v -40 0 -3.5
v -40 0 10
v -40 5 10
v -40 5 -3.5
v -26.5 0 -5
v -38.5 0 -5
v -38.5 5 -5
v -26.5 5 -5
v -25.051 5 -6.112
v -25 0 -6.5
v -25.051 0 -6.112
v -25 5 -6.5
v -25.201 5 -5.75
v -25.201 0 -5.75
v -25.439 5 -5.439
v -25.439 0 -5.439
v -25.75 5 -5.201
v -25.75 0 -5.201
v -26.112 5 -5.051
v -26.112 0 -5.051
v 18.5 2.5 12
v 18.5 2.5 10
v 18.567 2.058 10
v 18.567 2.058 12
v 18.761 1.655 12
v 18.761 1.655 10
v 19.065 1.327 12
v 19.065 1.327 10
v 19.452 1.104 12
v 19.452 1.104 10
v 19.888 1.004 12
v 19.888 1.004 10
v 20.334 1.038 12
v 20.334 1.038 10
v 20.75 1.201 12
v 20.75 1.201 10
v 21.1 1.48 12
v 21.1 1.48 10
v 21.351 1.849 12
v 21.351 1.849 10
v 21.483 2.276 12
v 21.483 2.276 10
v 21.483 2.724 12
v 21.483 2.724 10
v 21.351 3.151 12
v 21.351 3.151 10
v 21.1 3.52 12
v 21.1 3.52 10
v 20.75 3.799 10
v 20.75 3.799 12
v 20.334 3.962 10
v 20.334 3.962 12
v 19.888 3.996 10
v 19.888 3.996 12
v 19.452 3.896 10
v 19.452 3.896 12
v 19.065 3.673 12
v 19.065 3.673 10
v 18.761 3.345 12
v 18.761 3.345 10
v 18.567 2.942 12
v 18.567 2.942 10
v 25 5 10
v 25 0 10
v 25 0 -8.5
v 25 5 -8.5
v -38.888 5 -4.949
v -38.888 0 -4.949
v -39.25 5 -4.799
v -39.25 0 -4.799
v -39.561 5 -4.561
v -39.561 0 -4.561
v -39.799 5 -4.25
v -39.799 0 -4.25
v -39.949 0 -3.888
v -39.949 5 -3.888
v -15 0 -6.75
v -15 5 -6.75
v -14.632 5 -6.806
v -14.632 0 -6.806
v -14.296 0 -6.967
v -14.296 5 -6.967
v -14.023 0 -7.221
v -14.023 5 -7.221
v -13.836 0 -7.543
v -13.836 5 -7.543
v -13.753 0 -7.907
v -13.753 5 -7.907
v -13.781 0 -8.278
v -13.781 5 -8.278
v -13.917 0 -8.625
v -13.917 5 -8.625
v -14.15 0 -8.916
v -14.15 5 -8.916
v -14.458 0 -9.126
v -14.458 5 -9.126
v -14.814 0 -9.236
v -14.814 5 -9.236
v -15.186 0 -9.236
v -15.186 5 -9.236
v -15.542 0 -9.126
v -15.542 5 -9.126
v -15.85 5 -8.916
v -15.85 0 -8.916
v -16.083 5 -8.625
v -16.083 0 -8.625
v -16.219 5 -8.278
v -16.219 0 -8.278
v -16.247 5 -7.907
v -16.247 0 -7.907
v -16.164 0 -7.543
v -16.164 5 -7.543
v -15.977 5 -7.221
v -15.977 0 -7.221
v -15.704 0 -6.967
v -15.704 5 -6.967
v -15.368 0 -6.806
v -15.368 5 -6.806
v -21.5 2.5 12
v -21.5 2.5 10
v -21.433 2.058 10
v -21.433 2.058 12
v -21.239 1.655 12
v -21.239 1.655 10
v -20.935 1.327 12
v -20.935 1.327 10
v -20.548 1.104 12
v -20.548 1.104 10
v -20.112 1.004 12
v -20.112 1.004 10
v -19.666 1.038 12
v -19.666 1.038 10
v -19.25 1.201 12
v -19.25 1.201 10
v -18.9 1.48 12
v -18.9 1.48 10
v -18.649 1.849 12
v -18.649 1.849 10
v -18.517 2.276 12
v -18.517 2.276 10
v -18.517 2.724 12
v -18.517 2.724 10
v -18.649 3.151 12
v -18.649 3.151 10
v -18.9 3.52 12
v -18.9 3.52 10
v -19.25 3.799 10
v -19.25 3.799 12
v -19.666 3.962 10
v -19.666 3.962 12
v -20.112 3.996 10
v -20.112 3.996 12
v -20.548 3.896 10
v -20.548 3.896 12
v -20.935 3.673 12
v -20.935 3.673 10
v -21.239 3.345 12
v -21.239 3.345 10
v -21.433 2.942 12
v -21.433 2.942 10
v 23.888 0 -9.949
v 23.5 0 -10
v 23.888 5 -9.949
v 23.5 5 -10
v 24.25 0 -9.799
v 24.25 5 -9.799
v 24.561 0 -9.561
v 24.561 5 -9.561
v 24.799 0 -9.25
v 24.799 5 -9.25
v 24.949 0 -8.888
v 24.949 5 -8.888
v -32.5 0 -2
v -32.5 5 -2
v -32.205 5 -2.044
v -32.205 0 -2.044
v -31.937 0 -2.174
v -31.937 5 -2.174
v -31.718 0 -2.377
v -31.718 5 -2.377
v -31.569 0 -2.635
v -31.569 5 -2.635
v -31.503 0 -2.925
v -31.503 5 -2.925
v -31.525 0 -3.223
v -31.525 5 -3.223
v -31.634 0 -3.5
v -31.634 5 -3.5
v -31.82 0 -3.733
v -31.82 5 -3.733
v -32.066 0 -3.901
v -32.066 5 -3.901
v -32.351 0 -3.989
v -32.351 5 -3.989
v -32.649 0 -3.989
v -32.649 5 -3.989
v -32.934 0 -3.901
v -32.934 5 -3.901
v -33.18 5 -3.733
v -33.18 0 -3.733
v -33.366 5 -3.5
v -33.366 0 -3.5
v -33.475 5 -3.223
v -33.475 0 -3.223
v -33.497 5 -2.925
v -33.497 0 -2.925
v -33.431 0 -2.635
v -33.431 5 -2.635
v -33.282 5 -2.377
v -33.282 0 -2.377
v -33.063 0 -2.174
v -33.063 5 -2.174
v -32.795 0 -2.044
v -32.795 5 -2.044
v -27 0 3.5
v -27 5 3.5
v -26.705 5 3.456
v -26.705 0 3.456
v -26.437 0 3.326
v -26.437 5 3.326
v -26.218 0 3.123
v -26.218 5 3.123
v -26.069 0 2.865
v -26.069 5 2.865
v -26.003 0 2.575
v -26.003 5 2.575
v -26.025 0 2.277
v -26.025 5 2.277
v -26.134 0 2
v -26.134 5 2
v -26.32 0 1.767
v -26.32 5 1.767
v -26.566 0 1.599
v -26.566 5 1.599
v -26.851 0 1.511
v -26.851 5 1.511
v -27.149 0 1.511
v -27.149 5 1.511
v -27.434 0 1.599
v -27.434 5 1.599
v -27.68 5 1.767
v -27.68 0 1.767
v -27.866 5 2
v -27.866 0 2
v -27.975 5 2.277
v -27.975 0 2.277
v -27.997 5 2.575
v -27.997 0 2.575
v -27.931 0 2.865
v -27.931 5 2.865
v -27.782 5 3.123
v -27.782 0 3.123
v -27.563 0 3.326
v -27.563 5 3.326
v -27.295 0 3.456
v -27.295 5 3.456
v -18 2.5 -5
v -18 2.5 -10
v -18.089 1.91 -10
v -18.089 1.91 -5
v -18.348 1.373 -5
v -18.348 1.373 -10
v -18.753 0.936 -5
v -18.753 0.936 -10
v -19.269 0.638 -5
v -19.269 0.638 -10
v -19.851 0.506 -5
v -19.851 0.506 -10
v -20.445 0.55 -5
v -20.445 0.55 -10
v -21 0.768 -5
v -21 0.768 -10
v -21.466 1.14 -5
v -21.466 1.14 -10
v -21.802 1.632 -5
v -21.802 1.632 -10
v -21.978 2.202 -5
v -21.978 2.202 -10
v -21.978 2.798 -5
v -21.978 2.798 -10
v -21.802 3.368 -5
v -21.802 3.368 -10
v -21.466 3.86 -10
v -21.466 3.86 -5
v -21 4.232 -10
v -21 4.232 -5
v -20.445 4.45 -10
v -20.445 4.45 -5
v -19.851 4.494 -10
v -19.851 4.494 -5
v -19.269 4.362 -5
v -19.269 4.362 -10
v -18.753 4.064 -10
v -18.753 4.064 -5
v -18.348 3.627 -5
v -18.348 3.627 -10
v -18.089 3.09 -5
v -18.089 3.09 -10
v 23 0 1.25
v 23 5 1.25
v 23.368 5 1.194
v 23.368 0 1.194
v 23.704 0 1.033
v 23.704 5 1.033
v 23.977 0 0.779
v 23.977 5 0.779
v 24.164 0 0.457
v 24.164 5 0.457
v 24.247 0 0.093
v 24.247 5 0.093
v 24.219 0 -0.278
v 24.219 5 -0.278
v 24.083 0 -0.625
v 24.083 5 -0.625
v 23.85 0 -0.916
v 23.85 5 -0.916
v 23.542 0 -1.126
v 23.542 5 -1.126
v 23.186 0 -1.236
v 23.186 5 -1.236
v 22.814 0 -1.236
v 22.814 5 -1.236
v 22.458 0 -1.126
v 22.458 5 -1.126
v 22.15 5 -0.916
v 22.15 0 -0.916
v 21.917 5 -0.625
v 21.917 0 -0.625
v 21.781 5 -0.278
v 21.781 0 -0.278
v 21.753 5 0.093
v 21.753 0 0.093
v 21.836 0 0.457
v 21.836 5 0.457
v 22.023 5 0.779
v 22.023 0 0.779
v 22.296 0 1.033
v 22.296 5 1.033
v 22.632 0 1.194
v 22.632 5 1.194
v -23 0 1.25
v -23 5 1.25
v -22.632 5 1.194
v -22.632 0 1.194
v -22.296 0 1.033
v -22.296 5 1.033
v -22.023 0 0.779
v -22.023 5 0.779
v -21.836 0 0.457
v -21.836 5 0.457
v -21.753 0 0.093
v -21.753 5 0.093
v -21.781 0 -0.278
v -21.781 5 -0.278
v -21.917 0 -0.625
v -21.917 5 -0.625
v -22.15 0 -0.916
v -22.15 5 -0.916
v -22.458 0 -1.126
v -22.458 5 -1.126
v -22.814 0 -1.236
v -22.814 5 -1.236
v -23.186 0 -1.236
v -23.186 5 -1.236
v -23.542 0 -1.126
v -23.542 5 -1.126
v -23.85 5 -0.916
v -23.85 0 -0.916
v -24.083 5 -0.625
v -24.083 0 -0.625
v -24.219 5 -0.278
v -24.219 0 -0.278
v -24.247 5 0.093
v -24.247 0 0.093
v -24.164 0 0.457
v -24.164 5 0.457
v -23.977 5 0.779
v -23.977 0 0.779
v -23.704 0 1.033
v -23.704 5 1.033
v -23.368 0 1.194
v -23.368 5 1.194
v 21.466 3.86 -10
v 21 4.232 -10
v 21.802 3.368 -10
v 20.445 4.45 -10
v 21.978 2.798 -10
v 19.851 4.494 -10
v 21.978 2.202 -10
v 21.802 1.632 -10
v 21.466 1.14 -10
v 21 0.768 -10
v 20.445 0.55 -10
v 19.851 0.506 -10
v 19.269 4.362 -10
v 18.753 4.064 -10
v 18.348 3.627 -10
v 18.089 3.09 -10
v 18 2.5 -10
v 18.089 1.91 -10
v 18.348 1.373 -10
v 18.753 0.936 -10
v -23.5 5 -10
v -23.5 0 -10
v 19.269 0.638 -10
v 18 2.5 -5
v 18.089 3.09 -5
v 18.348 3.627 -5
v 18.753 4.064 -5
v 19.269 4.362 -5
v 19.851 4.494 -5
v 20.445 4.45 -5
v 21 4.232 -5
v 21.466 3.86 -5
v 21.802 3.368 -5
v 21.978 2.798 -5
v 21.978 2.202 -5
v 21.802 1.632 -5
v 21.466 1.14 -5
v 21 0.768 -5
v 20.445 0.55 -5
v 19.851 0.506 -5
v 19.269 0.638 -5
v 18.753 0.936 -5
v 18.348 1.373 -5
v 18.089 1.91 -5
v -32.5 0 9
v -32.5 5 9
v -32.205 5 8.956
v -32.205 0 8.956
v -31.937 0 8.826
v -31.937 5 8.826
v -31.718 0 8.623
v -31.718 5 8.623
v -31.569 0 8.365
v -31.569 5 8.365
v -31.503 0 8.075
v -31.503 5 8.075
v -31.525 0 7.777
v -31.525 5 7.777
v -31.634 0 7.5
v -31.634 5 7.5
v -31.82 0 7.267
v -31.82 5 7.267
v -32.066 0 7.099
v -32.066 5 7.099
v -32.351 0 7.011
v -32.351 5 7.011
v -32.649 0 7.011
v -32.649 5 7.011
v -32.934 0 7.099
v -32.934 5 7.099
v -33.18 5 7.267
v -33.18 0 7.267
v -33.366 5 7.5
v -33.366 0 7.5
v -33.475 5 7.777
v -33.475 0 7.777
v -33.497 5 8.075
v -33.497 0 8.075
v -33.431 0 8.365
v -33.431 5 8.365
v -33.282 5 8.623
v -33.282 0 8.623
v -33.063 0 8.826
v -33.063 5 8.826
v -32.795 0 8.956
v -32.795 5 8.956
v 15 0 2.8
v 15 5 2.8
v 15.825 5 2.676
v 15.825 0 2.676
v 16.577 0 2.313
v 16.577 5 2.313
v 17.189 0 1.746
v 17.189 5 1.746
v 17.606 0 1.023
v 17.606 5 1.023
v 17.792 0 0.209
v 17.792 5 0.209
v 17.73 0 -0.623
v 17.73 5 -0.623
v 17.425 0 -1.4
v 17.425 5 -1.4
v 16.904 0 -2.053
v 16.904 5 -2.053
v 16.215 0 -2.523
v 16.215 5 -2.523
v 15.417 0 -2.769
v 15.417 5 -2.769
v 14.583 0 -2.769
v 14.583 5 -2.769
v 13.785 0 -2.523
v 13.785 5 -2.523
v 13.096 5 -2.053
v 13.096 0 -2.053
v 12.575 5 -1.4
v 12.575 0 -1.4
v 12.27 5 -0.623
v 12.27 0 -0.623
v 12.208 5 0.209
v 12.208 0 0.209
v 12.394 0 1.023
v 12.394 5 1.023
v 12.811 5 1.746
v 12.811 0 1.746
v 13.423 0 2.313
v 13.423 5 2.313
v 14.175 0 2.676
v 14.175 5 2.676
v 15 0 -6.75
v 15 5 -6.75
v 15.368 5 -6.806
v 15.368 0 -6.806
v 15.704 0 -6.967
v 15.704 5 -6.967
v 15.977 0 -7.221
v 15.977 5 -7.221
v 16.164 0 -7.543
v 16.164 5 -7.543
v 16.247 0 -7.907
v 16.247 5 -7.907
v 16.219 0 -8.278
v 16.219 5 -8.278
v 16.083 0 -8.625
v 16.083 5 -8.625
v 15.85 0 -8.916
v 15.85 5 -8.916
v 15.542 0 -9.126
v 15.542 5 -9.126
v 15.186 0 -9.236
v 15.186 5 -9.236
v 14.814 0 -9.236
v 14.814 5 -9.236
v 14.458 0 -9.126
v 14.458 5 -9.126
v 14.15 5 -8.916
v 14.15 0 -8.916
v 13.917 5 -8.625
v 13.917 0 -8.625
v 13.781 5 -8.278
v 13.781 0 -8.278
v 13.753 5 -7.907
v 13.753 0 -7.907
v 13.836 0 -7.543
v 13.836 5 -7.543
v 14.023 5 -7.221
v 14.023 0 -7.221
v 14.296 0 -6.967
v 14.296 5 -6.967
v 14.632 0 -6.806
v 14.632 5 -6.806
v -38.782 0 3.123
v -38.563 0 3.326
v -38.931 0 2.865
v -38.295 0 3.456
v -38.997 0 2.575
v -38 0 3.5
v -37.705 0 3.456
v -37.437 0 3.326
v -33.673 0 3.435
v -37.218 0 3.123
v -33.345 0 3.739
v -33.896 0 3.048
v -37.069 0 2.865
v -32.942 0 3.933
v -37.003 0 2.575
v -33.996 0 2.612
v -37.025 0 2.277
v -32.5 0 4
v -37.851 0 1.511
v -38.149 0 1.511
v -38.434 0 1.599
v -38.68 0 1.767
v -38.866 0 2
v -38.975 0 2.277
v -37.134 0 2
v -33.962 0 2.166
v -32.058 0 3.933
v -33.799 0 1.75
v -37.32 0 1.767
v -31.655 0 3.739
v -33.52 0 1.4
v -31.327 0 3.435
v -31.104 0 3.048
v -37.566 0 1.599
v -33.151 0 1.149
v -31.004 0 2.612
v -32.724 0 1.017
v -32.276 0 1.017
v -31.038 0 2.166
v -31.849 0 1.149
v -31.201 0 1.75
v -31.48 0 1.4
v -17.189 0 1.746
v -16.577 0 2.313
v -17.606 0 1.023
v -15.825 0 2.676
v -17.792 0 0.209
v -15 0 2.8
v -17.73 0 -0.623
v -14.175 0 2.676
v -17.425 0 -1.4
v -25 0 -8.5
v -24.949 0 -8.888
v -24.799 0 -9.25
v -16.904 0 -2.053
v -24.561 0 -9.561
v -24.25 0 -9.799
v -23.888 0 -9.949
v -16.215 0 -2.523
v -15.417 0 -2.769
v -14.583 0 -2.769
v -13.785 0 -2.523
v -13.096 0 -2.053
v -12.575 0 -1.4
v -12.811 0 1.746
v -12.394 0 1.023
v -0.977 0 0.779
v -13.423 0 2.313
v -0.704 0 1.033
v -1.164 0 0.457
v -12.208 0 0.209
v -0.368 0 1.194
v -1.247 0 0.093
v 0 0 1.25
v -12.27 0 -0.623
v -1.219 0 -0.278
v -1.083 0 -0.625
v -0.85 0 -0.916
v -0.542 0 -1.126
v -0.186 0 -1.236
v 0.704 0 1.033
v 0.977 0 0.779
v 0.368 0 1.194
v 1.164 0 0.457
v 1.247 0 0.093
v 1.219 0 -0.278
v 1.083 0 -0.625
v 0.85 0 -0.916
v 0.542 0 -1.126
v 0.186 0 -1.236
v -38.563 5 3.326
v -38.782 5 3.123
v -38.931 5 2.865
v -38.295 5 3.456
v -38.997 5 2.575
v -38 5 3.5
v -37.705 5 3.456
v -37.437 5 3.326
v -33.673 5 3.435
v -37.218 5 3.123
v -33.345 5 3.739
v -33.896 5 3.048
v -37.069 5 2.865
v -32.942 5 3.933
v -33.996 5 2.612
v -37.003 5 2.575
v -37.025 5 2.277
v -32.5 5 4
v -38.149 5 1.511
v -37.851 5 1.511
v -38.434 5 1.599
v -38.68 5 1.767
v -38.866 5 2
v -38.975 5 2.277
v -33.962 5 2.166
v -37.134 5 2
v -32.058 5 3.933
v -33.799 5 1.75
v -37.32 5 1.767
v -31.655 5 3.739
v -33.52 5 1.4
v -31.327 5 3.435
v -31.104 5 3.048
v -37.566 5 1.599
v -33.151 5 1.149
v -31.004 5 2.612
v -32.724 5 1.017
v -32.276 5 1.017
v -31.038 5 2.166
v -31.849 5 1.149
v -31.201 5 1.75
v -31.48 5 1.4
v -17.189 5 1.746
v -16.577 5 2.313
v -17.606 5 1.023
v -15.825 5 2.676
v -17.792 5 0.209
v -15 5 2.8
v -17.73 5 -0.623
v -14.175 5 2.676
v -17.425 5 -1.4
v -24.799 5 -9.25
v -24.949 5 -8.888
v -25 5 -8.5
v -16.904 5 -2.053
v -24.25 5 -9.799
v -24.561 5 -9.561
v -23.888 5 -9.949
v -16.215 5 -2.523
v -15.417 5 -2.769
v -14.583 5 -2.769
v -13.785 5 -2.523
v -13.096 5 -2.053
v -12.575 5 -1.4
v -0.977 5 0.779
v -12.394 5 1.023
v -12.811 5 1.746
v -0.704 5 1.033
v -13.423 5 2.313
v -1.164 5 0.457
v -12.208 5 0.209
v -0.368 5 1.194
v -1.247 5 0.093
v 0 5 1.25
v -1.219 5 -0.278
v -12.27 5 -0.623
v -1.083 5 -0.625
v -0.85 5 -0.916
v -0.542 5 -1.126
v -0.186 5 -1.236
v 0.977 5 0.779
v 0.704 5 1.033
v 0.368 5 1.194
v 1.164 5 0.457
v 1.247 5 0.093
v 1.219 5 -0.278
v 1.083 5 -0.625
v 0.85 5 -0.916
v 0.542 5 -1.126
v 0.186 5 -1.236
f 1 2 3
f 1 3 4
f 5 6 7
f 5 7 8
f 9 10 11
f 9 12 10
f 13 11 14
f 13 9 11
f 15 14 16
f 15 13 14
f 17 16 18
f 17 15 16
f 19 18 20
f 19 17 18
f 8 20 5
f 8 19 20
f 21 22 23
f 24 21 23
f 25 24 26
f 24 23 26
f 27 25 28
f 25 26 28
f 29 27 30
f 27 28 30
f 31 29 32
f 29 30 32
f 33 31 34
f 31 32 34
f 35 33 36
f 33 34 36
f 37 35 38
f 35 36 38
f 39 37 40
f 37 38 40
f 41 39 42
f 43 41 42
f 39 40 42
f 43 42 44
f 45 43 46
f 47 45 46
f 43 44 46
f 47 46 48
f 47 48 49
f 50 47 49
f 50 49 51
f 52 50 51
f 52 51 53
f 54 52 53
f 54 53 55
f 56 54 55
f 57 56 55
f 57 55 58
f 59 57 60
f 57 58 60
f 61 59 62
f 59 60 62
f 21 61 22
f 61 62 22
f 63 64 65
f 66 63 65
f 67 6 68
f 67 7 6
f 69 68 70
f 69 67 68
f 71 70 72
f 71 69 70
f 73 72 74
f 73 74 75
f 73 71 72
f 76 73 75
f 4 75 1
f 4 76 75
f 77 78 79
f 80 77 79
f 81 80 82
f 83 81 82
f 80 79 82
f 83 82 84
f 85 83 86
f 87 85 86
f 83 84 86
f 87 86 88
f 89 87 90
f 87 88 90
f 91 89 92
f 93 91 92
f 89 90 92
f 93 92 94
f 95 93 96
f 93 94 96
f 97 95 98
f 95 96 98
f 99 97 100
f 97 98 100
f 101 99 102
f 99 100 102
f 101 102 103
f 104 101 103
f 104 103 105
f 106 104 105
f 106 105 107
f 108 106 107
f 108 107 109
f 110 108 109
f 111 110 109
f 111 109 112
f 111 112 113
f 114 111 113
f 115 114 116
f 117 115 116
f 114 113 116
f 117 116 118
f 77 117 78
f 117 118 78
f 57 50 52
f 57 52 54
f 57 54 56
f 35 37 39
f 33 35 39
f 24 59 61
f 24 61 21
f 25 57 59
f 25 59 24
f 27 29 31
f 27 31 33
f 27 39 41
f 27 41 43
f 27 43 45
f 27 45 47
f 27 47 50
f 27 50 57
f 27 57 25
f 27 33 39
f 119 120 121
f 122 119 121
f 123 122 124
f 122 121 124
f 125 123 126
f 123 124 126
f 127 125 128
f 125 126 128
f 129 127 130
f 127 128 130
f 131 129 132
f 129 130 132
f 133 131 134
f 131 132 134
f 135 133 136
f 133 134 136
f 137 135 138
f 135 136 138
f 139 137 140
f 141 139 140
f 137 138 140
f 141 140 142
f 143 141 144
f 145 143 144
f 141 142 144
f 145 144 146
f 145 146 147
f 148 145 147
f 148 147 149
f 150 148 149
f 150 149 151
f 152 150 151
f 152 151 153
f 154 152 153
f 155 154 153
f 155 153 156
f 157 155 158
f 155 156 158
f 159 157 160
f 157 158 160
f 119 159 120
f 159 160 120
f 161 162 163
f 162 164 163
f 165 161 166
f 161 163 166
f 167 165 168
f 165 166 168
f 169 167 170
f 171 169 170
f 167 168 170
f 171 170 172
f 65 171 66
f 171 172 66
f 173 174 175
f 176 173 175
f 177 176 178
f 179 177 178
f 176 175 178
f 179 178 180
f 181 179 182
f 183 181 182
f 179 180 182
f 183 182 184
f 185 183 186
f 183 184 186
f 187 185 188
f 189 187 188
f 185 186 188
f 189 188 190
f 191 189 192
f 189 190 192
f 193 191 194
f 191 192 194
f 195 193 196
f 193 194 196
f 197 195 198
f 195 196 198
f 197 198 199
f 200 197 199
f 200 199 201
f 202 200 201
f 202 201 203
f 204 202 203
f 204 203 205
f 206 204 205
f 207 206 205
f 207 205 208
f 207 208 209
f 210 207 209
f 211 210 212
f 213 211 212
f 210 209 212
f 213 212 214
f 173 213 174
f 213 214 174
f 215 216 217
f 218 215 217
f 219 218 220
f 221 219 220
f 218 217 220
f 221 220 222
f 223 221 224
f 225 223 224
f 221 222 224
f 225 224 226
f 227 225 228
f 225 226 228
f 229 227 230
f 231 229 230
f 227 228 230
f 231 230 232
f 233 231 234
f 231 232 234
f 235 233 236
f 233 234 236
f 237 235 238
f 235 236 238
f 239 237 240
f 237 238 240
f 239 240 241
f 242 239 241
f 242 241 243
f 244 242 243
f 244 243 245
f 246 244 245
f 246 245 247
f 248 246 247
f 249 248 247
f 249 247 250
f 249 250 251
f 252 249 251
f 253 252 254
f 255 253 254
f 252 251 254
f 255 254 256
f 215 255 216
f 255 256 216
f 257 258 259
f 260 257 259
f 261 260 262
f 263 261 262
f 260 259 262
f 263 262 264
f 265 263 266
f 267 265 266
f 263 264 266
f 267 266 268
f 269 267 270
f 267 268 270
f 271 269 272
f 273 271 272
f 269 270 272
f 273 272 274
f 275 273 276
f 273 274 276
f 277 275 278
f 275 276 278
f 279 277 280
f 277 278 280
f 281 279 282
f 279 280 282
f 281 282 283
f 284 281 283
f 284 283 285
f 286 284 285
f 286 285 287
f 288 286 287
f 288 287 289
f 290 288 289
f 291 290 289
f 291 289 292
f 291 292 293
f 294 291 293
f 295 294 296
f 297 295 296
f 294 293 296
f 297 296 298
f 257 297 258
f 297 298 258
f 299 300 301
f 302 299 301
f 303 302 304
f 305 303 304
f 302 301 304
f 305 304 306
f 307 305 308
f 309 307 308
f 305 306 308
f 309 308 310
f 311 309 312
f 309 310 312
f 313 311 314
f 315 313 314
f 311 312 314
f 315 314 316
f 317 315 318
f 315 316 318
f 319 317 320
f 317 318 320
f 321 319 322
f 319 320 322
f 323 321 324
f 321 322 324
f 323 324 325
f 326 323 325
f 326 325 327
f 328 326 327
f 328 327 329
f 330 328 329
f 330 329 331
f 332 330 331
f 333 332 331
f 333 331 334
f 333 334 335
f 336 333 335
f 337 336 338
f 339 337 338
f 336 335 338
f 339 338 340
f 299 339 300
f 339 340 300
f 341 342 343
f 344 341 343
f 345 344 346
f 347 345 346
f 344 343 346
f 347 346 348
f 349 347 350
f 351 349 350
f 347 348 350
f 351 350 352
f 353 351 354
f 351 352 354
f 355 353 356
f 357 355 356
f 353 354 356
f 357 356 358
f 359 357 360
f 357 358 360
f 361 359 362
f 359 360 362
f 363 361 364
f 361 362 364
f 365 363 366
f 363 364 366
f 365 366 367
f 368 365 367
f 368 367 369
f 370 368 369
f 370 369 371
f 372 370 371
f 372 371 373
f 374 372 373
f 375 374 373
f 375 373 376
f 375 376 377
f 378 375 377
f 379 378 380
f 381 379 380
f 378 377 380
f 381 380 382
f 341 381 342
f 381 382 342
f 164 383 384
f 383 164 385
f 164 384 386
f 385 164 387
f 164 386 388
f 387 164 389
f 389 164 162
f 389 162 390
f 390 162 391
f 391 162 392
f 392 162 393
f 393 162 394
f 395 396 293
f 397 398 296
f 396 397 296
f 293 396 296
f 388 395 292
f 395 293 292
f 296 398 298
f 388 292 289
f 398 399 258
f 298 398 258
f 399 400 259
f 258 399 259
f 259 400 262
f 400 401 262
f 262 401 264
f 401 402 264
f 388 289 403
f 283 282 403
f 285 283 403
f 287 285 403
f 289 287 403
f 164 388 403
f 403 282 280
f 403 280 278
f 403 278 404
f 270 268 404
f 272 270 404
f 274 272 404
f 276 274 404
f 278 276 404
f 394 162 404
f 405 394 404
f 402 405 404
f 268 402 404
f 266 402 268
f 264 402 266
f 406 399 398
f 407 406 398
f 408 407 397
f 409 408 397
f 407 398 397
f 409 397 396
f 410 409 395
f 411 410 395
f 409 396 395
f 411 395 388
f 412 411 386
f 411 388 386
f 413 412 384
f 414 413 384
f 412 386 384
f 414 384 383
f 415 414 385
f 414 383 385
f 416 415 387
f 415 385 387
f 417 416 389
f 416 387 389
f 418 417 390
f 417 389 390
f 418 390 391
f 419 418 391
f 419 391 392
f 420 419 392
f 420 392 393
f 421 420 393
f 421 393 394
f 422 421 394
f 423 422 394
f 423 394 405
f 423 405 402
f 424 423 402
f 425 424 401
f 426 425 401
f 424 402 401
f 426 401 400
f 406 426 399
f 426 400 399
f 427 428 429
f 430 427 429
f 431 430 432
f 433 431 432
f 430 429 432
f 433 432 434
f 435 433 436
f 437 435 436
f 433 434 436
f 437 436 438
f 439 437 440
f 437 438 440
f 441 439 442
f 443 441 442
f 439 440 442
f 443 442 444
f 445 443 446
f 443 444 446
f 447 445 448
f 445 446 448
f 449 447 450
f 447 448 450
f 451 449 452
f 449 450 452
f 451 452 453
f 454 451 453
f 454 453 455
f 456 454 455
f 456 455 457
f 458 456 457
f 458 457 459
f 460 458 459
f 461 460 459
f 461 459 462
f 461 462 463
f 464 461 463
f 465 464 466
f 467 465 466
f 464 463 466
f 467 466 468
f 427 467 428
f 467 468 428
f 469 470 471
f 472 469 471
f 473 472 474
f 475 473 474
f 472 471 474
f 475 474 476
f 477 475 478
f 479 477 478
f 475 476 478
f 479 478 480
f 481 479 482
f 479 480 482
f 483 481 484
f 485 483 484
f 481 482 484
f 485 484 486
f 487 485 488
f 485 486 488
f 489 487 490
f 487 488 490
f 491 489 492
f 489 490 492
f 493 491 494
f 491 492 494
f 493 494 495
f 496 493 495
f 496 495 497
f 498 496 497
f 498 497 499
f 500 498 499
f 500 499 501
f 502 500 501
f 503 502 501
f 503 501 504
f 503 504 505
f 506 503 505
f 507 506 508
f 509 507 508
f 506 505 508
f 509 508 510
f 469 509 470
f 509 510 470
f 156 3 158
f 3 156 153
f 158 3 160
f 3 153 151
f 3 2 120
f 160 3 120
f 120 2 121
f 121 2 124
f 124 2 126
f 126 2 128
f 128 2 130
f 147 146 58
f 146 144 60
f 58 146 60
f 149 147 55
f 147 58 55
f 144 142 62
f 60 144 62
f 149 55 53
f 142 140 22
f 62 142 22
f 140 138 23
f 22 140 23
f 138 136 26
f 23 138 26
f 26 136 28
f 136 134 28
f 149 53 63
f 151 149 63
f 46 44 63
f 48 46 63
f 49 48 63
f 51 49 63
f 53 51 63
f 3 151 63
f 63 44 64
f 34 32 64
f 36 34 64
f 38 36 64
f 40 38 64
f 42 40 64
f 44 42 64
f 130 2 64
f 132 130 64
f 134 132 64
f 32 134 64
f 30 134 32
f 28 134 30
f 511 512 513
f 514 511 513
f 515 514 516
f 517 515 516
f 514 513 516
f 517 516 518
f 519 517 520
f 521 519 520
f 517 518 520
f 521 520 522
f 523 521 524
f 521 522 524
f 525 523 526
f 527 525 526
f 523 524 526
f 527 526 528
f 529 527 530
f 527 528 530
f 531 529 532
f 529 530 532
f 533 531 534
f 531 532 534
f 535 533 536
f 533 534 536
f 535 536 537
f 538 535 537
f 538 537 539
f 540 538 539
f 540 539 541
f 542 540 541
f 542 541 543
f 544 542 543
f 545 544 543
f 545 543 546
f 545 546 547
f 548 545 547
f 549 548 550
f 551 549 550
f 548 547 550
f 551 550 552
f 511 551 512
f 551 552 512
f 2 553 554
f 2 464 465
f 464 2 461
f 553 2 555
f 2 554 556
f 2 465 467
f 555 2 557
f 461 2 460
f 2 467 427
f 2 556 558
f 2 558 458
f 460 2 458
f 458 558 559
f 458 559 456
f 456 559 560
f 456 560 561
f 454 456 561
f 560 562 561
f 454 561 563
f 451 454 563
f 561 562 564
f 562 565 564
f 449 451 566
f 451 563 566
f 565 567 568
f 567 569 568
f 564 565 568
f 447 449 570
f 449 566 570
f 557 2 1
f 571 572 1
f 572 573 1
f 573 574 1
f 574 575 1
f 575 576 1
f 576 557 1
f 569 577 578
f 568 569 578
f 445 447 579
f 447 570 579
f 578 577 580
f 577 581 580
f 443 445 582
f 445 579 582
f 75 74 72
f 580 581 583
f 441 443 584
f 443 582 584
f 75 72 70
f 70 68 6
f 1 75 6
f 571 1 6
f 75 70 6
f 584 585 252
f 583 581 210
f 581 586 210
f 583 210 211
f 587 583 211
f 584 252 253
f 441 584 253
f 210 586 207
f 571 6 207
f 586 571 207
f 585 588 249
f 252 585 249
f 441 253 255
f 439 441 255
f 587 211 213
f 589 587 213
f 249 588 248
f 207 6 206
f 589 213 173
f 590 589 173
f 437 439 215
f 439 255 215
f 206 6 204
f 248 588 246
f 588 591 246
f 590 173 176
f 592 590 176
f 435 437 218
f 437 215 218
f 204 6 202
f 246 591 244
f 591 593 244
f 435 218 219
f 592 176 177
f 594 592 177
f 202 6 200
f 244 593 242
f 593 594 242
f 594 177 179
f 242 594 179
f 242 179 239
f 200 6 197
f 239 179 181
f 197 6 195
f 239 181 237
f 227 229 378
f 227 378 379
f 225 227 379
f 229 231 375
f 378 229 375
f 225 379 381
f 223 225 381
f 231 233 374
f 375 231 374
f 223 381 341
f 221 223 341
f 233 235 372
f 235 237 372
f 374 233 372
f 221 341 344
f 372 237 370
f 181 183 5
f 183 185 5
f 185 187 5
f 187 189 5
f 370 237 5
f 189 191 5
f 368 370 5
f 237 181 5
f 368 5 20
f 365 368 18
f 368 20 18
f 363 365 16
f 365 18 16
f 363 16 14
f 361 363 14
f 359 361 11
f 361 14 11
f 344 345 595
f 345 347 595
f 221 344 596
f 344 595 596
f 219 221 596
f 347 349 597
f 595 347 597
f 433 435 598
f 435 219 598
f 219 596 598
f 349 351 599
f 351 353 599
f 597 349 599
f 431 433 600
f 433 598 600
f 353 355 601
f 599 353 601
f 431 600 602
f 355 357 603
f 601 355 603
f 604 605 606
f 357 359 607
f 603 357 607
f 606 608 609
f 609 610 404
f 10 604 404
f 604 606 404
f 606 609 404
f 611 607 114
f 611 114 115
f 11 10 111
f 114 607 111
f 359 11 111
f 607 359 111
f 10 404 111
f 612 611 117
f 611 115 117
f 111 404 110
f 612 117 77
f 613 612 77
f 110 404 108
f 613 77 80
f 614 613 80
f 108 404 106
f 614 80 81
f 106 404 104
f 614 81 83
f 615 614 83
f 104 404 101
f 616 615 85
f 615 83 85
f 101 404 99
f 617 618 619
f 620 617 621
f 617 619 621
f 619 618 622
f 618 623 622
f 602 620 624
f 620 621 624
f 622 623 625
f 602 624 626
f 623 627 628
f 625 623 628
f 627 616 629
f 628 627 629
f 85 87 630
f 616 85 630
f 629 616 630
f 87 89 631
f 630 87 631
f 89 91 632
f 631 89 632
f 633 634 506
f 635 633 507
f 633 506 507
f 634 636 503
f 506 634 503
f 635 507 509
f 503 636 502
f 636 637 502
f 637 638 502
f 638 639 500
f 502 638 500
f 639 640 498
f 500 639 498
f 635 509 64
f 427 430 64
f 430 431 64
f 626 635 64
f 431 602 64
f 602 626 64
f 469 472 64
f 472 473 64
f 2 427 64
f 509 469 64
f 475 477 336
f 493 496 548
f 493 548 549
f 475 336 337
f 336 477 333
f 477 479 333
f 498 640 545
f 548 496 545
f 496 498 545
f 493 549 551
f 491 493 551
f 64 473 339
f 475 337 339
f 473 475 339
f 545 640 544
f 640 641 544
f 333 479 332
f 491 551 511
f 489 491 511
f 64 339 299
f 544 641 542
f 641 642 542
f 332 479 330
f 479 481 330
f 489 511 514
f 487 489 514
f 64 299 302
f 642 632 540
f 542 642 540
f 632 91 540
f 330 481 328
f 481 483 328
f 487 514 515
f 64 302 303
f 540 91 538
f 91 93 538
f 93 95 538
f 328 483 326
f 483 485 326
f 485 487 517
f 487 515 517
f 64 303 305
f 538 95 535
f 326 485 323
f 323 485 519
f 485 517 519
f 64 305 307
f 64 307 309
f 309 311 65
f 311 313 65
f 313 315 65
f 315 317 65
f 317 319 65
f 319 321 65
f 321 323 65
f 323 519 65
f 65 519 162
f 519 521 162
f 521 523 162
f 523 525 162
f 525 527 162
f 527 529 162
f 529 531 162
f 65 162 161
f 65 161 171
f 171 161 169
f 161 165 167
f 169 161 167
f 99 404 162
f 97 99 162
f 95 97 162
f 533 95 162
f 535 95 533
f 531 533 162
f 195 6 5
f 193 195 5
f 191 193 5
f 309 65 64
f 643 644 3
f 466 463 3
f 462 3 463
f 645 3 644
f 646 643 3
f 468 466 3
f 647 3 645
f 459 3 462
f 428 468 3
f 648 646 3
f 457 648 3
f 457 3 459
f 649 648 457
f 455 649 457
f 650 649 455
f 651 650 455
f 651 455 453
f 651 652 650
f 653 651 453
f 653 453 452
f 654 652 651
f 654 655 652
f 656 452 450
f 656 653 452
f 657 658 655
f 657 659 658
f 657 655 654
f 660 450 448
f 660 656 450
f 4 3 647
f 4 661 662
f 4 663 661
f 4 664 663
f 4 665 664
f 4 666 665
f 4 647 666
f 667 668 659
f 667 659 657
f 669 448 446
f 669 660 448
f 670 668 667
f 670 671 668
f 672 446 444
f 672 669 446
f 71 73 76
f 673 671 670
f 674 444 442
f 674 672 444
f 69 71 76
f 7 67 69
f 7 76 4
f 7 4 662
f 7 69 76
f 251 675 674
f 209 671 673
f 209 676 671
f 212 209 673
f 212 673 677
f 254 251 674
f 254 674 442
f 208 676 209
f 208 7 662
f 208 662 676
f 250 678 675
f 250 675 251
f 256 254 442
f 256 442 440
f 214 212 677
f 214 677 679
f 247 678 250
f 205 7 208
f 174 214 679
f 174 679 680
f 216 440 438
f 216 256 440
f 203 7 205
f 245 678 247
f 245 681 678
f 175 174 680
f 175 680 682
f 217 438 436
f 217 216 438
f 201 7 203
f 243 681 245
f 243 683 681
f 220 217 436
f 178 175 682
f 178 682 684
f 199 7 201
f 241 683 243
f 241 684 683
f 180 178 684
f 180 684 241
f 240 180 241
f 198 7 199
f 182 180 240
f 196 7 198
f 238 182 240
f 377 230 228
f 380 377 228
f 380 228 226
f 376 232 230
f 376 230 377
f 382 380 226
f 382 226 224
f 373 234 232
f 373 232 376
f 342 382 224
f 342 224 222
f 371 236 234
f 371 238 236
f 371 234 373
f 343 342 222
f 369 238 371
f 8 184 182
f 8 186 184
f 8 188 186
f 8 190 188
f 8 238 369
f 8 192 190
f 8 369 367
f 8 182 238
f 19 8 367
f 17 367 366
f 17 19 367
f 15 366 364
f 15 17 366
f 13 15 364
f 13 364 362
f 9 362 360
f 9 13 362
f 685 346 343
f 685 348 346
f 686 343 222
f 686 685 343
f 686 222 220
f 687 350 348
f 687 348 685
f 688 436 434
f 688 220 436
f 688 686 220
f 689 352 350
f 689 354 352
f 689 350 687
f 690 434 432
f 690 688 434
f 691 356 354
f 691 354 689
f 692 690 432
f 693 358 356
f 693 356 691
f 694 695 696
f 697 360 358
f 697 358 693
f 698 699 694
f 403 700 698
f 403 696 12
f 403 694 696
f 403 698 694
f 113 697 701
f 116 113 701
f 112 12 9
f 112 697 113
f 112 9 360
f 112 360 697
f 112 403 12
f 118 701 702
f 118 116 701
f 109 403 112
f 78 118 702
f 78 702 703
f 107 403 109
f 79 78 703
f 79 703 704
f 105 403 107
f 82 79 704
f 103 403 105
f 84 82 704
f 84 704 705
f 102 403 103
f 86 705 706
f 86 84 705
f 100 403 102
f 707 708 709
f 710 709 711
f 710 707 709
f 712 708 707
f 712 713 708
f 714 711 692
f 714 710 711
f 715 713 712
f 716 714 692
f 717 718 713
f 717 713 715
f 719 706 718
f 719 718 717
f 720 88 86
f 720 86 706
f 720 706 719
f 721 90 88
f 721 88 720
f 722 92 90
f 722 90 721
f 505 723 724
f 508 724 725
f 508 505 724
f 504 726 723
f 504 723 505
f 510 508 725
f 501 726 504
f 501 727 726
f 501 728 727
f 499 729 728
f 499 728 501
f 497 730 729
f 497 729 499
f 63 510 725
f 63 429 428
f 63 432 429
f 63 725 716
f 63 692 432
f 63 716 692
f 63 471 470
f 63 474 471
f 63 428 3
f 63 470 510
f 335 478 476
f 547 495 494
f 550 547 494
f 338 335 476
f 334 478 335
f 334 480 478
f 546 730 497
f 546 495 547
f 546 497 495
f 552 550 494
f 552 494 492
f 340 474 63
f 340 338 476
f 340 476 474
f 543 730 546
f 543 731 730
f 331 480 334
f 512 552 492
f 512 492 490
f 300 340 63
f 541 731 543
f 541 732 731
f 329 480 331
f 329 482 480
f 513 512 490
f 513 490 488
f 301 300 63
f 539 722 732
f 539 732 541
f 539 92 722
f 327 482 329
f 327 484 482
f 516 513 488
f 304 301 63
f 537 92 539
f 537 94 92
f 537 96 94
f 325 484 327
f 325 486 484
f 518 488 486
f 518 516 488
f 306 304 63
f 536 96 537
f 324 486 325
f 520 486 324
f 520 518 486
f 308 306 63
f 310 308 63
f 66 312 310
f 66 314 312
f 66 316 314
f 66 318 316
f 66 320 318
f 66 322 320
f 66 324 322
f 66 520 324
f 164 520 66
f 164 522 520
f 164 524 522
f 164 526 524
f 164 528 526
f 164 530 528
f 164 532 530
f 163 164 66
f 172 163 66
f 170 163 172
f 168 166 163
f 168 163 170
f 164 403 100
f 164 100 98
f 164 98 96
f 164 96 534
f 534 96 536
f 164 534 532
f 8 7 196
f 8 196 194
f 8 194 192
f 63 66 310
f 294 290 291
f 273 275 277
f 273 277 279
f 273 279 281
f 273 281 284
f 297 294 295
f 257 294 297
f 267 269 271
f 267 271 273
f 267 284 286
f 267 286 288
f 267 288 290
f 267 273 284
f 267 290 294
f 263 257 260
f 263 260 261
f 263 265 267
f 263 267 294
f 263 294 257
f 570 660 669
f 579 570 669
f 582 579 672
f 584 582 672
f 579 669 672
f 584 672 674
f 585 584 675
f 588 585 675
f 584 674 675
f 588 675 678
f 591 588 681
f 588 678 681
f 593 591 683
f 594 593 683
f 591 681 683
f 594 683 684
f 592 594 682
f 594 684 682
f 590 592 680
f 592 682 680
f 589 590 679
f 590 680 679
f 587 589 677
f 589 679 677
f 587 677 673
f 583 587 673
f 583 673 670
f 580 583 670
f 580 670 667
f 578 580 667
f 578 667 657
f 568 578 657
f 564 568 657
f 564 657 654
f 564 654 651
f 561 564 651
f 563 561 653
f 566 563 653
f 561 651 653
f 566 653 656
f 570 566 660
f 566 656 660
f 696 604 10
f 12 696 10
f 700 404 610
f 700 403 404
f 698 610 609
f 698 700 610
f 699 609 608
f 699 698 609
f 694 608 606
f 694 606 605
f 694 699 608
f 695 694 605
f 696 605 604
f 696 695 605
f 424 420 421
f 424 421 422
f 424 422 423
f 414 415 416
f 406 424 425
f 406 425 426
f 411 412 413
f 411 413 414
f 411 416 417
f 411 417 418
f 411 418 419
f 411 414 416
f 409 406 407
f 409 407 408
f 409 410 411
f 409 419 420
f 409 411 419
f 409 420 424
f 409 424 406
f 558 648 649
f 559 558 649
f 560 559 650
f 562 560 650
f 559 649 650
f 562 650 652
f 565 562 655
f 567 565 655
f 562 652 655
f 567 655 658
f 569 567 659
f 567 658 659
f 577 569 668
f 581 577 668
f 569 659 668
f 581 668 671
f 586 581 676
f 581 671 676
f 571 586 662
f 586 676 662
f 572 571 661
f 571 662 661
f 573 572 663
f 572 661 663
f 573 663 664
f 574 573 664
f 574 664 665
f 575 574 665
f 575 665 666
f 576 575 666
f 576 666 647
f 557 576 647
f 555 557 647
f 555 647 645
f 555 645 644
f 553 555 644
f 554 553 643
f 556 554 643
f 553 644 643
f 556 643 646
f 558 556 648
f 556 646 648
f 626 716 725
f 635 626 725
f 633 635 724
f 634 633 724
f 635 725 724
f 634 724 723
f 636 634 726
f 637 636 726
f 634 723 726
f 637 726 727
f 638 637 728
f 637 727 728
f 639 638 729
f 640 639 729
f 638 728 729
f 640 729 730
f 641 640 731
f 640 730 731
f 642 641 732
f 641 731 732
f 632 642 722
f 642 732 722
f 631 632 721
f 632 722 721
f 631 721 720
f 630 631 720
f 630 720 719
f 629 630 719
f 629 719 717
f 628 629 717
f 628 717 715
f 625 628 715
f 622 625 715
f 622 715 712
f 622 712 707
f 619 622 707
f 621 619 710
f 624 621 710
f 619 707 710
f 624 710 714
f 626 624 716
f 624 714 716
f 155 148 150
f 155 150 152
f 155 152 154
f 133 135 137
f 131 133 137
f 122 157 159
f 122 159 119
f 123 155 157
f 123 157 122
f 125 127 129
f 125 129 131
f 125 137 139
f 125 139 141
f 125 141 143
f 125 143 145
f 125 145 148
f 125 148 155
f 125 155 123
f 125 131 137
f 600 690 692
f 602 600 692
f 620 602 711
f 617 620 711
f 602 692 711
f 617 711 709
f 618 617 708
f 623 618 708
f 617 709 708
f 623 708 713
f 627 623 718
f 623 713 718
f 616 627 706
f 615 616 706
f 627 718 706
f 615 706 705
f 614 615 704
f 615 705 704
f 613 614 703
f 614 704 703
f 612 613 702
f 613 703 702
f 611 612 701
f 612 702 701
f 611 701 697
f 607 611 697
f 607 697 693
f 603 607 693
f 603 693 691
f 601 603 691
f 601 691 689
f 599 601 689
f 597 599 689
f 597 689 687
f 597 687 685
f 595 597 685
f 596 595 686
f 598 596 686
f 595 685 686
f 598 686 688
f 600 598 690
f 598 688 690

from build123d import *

# Parameters (mm, degrees)
SKETCH_1_W          = 15
SKETCH_1_H          = 15
EXTRUDE_1_DEPTH     = 5
SKETCH_2_R          = 1.25
SKETCH_2_R_2        = 2.8
SKETCH_2_R_3        = 1.5
SKETCH_2_R_4        = 1
CUT_EXTRUDE_1_DEPTH = 5
FILLET_1_R          = 1.5
SKETCH_4_R          = 1.5
EXTRUDE_2_DEPTH     = 2
SKETCH_5_R          = 2
CUT_EXTRUDE_2_DEPTH = 5


with BuildPart() as part:
    # 草图1 → 凸台-拉伸1 (new body)
    with BuildSketch(Plane(origin=(0, 0, 0), x_dir=(1, 0, 0), z_dir=(0, 1, 0))):
        Polygon((25, 10), (-25, 10), (-25, 5), (-25, -10), (25, -10), align=None)
        with Locations((-32.5, -2.5)):
            Rectangle(SKETCH_1_W, SKETCH_1_H)
    extrude(amount=EXTRUDE_1_DEPTH)

    # 草图2 → 切除-拉伸1 (cut)
    with BuildSketch(Plane(origin=(0, 5, 0), x_dir=(1, 0, 0), z_dir=(0, 1, 0))):
        with Locations(Location((0, 0, 0), (0, 0, 270))):
            Circle(SKETCH_2_R)
        with Locations(Location((15, 0, 0), (0, 0, 270))):
            Circle(SKETCH_2_R_2)
        with Locations(Location((-15, 0, 0), (0, 0, 270))):
            Circle(SKETCH_2_R_2)
        with Locations(Location((15, 8, 0), (0, 0, 270))):
            Circle(SKETCH_2_R)
        with Locations(Location((23, 0, 0), (0, 0, 270))):
            Circle(SKETCH_2_R)
        with Locations(Location((-23, 0, 0), (0, 0, 270))):
            Circle(SKETCH_2_R)
        with Locations(Location((-15, 8, 0), (0, 0, 270))):
            Circle(SKETCH_2_R)
        with Locations(Location((-32.5, -2.5, 0), (0, 0, 270))):
            Circle(SKETCH_2_R_3)
        with Locations(Location((-27, -2.5, 0), (0, 0, 270))):
            Circle(SKETCH_2_R_4)
        with Locations(Location((-32.5, -8, 0), (0, 0, 270))):
            Circle(SKETCH_2_R_4)
        with Locations(Location((-38, -2.5, 0), (0, 0, 270))):
            Circle(SKETCH_2_R_4)
        with Locations(Location((-32.5, 3, 0), (0, 0, 270))):
            Circle(SKETCH_2_R_4)
    extrude(amount=-CUT_EXTRUDE_1_DEPTH, mode=Mode.SUBTRACT)

    # 圆角1
    fillet_1_edges = [part.edges().sort_by_distance(p)[0] for p in [
        (-25, 2.5, -5),
        (-40, 2.5, -5),
        (-25, 2.5, -10),
        (25, 2.5, -10),
    ]]
    fillet(fillet_1_edges, radius=FILLET_1_R)

    # 草图4 → 凸台-拉伸2 (add)
    with BuildSketch(Plane.XY.offset(10)):
        with Locations(Location((20, 2.5, 0), (0, 0, 180))):
            Circle(SKETCH_4_R)
        with Locations(Location((-20, 2.5, 0), (0, 0, 180))):
            Circle(SKETCH_4_R)
    extrude(amount=EXTRUDE_2_DEPTH)

    # 草图5 → 切除-拉伸2 (cut)
    with BuildSketch(Plane(origin=(0, 0, -10), x_dir=(-1, 0, 0), z_dir=(0, 0, -1))):
        with Locations((-20, 2.5)):
            Circle(SKETCH_5_R)
        with Locations(Location((20, 2.5, 0), (0, 0, 180))):
            Circle(SKETCH_5_R)
    extrude(amount=-CUT_EXTRUDE_2_DEPTH, mode=Mode.SUBTRACT)


solid = part.part
